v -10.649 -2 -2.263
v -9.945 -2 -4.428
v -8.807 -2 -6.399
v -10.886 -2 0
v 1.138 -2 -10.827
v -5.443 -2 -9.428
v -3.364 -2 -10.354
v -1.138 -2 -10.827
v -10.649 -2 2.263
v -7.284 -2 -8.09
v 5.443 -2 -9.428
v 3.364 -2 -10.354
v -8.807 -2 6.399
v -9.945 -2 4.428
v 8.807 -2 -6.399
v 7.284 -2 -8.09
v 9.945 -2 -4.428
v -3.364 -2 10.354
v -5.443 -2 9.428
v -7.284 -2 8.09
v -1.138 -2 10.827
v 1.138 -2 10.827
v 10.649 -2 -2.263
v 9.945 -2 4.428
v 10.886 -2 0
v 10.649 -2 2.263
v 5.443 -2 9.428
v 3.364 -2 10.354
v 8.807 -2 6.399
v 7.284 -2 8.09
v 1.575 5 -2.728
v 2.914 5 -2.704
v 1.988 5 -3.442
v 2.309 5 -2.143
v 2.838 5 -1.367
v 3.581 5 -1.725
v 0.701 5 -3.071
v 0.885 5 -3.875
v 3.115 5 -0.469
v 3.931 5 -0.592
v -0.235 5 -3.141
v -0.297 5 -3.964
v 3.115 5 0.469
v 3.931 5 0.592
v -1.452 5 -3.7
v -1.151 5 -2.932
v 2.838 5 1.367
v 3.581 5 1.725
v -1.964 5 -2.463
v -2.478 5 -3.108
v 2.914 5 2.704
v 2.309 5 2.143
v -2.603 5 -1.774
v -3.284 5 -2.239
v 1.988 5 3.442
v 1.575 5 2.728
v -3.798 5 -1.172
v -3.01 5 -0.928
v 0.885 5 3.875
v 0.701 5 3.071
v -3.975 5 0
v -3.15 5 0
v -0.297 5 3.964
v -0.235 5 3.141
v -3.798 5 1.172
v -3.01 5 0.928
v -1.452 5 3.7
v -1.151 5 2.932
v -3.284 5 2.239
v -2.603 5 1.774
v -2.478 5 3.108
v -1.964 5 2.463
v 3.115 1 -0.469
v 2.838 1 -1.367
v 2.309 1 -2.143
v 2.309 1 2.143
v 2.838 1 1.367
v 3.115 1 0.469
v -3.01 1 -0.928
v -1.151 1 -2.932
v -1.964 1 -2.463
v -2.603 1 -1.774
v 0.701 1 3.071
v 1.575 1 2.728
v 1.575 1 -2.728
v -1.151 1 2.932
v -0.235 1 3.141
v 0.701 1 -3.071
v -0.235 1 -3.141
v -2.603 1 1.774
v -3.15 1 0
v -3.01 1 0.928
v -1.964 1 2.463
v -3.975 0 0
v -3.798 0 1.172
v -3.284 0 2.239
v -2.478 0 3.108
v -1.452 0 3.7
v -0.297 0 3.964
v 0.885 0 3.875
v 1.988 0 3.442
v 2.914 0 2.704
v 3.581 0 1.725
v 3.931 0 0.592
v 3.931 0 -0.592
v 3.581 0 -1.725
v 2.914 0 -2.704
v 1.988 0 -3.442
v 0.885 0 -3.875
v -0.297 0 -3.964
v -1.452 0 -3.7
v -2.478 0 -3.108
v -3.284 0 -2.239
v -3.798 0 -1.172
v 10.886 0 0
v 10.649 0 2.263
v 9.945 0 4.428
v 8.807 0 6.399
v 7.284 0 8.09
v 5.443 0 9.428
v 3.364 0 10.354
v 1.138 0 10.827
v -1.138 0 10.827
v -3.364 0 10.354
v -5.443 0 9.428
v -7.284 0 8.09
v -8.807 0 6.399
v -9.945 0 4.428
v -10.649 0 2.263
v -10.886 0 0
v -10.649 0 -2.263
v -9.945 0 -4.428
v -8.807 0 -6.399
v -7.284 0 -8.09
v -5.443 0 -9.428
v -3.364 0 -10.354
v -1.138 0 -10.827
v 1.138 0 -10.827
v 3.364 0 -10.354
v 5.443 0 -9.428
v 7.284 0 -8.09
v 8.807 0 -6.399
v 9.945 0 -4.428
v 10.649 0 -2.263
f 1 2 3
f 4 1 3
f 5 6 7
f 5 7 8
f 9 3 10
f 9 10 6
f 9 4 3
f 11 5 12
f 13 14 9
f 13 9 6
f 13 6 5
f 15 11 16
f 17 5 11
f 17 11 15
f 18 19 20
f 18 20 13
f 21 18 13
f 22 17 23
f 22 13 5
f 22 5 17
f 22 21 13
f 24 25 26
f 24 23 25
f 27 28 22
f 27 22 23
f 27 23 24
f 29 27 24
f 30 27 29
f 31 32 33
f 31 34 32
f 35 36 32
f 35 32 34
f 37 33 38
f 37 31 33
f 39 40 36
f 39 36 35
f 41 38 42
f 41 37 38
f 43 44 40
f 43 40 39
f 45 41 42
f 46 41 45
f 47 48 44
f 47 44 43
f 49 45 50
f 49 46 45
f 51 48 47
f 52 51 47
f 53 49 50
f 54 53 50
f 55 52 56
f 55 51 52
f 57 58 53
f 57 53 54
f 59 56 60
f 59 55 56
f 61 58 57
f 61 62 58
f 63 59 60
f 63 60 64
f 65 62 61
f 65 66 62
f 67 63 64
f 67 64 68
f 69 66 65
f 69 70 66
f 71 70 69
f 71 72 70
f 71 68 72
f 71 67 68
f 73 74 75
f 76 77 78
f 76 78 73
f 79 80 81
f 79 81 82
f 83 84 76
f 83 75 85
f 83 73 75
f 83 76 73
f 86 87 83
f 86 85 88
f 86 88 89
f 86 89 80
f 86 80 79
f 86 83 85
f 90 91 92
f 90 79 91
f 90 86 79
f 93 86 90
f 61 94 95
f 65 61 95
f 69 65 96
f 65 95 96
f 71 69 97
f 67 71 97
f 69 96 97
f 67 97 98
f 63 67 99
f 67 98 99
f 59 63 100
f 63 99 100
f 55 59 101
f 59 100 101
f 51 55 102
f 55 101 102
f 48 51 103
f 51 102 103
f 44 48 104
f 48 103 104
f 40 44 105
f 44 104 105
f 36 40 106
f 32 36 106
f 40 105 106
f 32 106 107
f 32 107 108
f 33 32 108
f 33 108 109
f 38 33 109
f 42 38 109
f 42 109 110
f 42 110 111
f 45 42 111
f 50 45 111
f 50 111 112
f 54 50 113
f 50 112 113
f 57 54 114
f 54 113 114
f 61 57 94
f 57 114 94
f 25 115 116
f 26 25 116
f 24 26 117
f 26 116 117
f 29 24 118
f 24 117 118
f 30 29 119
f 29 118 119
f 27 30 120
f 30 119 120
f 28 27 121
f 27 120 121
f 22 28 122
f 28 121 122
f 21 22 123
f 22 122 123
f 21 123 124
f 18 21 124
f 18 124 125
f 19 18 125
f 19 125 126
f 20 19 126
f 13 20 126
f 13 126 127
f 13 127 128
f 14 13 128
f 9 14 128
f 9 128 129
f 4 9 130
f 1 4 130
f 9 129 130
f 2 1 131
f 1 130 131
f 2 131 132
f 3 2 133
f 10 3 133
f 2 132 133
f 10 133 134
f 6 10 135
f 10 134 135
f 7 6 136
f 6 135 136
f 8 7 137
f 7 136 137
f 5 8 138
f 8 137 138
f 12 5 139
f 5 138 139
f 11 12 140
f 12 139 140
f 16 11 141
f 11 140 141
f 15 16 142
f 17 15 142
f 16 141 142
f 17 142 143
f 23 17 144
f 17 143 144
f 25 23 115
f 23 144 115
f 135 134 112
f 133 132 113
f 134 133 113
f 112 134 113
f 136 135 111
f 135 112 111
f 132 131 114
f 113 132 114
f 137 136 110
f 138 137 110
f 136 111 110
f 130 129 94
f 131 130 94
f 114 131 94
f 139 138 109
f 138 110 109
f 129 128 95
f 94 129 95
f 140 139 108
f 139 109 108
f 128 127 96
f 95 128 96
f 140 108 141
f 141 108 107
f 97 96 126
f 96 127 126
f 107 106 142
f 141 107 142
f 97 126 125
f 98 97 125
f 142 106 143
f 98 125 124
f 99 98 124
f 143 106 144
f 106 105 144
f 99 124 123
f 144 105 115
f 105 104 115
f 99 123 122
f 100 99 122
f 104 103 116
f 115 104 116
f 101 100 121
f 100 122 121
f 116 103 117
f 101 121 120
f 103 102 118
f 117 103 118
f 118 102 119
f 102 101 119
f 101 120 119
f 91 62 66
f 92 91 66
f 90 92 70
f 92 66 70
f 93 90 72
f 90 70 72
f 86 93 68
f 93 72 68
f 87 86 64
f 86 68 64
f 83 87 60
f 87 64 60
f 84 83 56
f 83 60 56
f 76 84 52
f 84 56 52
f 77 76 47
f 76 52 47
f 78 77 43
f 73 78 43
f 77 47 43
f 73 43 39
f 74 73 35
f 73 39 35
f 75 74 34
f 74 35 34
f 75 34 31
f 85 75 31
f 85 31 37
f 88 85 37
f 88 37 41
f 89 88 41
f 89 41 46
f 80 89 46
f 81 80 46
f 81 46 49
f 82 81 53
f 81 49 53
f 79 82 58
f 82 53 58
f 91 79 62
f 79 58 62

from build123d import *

# Parameters (mm, degrees)
F0_R     = 10.886435
F1_DEPTH = 2
F2_R     = 3.975
F3_DEPTH = 5
F4_R     = 3.15
F5_DEPTH = 4


with BuildPart() as f1:
    # F0 (on Front) → F1 (new body)
    with BuildSketch(Plane.XZ):
        Circle(F0_R)
    extrude(amount=F1_DEPTH)

    # F2 (on face) → F3 (join)
    with BuildSketch(Plane(origin=(0, 0, 0), x_dir=(-1, 0, 0), z_dir=(0, 1, 0))):
        Circle(F2_R)
    extrude(amount=F3_DEPTH)

    # F4 (on face) → F5 (cut)
    with BuildSketch(Plane(origin=(0, 5, 0), x_dir=(-1, 0, 0), z_dir=(0, 1, 0))):
        Circle(F4_R)
    extrude(amount=-F5_DEPTH, mode=Mode.SUBTRACT)


solid = f1.part
